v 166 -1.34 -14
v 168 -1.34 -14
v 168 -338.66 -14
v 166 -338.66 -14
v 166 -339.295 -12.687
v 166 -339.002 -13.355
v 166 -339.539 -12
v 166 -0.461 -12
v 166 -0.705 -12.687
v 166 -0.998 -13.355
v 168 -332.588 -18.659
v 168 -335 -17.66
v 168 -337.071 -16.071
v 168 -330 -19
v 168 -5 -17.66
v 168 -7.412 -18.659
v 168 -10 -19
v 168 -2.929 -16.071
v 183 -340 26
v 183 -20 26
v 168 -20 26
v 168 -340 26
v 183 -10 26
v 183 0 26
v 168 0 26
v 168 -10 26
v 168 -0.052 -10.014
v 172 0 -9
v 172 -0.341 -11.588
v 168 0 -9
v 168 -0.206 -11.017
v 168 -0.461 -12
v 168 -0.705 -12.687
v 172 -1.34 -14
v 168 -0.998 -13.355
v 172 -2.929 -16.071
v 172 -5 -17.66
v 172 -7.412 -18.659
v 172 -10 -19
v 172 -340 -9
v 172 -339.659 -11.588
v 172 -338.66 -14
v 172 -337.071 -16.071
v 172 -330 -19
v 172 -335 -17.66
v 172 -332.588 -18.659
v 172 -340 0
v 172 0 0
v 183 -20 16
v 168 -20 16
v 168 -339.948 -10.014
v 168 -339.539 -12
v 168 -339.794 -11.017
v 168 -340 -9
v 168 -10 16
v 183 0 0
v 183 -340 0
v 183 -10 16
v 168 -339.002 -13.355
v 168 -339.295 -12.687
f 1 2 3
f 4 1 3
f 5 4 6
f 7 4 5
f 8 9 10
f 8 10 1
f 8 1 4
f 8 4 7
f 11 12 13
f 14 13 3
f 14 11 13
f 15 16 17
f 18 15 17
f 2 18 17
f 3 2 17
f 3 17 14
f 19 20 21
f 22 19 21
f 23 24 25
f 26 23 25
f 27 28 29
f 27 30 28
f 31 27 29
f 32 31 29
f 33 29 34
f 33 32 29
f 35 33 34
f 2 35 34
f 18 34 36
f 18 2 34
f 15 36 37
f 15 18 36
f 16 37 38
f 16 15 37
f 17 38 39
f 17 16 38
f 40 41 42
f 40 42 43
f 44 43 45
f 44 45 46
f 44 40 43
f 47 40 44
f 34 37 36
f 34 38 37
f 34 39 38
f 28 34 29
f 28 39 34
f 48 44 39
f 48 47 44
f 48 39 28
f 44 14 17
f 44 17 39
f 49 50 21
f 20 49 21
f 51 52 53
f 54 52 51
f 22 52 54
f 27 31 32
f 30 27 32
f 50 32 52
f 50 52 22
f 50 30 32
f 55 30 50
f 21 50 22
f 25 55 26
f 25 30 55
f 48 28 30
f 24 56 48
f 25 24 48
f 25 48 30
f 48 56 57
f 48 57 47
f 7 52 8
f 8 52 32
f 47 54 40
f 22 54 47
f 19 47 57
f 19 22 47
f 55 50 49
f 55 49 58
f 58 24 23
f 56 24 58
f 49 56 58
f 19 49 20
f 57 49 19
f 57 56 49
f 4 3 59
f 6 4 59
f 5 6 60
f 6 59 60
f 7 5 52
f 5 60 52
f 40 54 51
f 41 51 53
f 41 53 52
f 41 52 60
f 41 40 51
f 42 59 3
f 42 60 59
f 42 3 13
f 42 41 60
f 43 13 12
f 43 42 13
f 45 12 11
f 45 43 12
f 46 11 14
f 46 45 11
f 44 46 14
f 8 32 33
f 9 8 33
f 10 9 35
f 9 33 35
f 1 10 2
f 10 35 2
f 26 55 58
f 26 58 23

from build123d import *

# Parameters (mm, degrees)
EXTRUDE_1_DEPTH     = 26
SKETCH_1_4_W        = 4
SKETCH_1_4_H        = 340
EXTRUDE_2_DEPTH     = 19
FILLET_1_R          = 10
EXTRUDE_3_DEPTH     = 2
SKETCH_5_W          = 161
SKETCH_5_H          = 6
CUT_EXTRUDE_1_DEPTH = 52
SKETCH_6_W          = 156.446977918
SKETCH_6_H          = 480.108754565
CUT_EXTRUDE_3_DEPTH = 401
SKETCH_7_W          = 10
SKETCH_7_H          = 10
CUT_EXTRUDE_4_DEPTH = 401
EXTRUDE_5_DEPTH     = 2


with BuildPart() as part:
    # 스케치1 → 보스-돌출1 (new body)
    with BuildSketch(Plane.XY):
        Polygon((-168, 0), (168, 0), (183, 0), (183, -340), (168, -340), (168, -20), (-168, -20), (-168, -340), (-183, -340), (-183, 0), align=None)
    extrude(amount=EXTRUDE_1_DEPTH)

    # 스케치1<4> → 보스-돌출2 (add)
    with BuildSketch(Plane.XY):
        with Locations((-170, -170)):
            Rectangle(SKETCH_1_4_W, SKETCH_1_4_H)
        with Locations((170, -170)):
            Rectangle(SKETCH_1_4_W, SKETCH_1_4_H)
    extrude(amount=-EXTRUDE_2_DEPTH)

    # 필렛1
    fillet_1_edges = [part.edges().sort_by_distance(p)[0] for p in [
        (-170, 0, -19),
        (170, 0, -19),
        (170, -340, -19),
        (-170, -340, -19),
    ]]
    fillet(fillet_1_edges, radius=FILLET_1_R)

    # 스케치3 → 보스-돌출3 (add)
    with BuildSketch(Plane.ZY.offset(-168)):
        with BuildLine():
            Line((-12, -339.539392014), (-12, -0.460607986))
            ThreePointArc((-12, -0.460607986), (-13.02408013, -0.845395743), (-14, -1.339745962))
            Line((-14, -1.339745962), (-14, -338.660254038))
            ThreePointArc((-14, -338.660254038), (-13.02408013, -339.154604257), (-12, -339.539392014))
        make_face()
    extrude_3 = extrude(amount=EXTRUDE_3_DEPTH)

    # 대칭 복사1: 보스-돌출3 across plane
    add(extrude_3.mirror(Plane(origin=(0, 0, 0), x_dir=(0, 0, 1), z_dir=(1, 0, 0))))

    # 스케치5 → 컷-돌출1 (cut)
    with BuildSketch(Plane(origin=(0, 0, 0), x_dir=(1, 0, 0), z_dir=(0, 1, 0))):
        with Locations((-87.5, -3)):
            Rectangle(SKETCH_5_W, SKETCH_5_H)
        with Locations((87.5, -3)):
            Rectangle(SKETCH_5_W, SKETCH_5_H)
    extrude(amount=-CUT_EXTRUDE_1_DEPTH, mode=Mode.SUBTRACT)

    # 스케치6 → 컷-돌출3 (cut)
    with BuildSketch(Plane.ZY.offset(-168)):
        with Locations((6.474112075, -134.168402936)):
            Rectangle(SKETCH_6_W, SKETCH_6_H)
    extrude(amount=CUT_EXTRUDE_3_DEPTH, mode=Mode.SUBTRACT)

    # 스케치7 → 컷-돌출4 (cut)
    with BuildSketch(Plane.ZY.offset(-168)):
        with Locations((21, -15)):
            Rectangle(SKETCH_7_W, SKETCH_7_H)
    extrude(amount=-CUT_EXTRUDE_4_DEPTH, mode=Mode.SUBTRACT)

    # 스케치3<3> → 보스-돌출5 (add)
    with BuildSketch(Plane.ZY.offset(-168)):
        with BuildLine():
            Line((-12, -339.539392014), (-12, -0.460607986))
            ThreePointArc((-12, -0.460607986), (-13.02408013, -0.845395743), (-14, -1.339745962))
            Line((-14, -1.339745962), (-14, -338.660254038))
            ThreePointArc((-14, -338.660254038), (-13.02408013, -339.154604257), (-12, -339.539392014))
        make_face()
    extrude(amount=EXTRUDE_5_DEPTH)


solid = part.part
